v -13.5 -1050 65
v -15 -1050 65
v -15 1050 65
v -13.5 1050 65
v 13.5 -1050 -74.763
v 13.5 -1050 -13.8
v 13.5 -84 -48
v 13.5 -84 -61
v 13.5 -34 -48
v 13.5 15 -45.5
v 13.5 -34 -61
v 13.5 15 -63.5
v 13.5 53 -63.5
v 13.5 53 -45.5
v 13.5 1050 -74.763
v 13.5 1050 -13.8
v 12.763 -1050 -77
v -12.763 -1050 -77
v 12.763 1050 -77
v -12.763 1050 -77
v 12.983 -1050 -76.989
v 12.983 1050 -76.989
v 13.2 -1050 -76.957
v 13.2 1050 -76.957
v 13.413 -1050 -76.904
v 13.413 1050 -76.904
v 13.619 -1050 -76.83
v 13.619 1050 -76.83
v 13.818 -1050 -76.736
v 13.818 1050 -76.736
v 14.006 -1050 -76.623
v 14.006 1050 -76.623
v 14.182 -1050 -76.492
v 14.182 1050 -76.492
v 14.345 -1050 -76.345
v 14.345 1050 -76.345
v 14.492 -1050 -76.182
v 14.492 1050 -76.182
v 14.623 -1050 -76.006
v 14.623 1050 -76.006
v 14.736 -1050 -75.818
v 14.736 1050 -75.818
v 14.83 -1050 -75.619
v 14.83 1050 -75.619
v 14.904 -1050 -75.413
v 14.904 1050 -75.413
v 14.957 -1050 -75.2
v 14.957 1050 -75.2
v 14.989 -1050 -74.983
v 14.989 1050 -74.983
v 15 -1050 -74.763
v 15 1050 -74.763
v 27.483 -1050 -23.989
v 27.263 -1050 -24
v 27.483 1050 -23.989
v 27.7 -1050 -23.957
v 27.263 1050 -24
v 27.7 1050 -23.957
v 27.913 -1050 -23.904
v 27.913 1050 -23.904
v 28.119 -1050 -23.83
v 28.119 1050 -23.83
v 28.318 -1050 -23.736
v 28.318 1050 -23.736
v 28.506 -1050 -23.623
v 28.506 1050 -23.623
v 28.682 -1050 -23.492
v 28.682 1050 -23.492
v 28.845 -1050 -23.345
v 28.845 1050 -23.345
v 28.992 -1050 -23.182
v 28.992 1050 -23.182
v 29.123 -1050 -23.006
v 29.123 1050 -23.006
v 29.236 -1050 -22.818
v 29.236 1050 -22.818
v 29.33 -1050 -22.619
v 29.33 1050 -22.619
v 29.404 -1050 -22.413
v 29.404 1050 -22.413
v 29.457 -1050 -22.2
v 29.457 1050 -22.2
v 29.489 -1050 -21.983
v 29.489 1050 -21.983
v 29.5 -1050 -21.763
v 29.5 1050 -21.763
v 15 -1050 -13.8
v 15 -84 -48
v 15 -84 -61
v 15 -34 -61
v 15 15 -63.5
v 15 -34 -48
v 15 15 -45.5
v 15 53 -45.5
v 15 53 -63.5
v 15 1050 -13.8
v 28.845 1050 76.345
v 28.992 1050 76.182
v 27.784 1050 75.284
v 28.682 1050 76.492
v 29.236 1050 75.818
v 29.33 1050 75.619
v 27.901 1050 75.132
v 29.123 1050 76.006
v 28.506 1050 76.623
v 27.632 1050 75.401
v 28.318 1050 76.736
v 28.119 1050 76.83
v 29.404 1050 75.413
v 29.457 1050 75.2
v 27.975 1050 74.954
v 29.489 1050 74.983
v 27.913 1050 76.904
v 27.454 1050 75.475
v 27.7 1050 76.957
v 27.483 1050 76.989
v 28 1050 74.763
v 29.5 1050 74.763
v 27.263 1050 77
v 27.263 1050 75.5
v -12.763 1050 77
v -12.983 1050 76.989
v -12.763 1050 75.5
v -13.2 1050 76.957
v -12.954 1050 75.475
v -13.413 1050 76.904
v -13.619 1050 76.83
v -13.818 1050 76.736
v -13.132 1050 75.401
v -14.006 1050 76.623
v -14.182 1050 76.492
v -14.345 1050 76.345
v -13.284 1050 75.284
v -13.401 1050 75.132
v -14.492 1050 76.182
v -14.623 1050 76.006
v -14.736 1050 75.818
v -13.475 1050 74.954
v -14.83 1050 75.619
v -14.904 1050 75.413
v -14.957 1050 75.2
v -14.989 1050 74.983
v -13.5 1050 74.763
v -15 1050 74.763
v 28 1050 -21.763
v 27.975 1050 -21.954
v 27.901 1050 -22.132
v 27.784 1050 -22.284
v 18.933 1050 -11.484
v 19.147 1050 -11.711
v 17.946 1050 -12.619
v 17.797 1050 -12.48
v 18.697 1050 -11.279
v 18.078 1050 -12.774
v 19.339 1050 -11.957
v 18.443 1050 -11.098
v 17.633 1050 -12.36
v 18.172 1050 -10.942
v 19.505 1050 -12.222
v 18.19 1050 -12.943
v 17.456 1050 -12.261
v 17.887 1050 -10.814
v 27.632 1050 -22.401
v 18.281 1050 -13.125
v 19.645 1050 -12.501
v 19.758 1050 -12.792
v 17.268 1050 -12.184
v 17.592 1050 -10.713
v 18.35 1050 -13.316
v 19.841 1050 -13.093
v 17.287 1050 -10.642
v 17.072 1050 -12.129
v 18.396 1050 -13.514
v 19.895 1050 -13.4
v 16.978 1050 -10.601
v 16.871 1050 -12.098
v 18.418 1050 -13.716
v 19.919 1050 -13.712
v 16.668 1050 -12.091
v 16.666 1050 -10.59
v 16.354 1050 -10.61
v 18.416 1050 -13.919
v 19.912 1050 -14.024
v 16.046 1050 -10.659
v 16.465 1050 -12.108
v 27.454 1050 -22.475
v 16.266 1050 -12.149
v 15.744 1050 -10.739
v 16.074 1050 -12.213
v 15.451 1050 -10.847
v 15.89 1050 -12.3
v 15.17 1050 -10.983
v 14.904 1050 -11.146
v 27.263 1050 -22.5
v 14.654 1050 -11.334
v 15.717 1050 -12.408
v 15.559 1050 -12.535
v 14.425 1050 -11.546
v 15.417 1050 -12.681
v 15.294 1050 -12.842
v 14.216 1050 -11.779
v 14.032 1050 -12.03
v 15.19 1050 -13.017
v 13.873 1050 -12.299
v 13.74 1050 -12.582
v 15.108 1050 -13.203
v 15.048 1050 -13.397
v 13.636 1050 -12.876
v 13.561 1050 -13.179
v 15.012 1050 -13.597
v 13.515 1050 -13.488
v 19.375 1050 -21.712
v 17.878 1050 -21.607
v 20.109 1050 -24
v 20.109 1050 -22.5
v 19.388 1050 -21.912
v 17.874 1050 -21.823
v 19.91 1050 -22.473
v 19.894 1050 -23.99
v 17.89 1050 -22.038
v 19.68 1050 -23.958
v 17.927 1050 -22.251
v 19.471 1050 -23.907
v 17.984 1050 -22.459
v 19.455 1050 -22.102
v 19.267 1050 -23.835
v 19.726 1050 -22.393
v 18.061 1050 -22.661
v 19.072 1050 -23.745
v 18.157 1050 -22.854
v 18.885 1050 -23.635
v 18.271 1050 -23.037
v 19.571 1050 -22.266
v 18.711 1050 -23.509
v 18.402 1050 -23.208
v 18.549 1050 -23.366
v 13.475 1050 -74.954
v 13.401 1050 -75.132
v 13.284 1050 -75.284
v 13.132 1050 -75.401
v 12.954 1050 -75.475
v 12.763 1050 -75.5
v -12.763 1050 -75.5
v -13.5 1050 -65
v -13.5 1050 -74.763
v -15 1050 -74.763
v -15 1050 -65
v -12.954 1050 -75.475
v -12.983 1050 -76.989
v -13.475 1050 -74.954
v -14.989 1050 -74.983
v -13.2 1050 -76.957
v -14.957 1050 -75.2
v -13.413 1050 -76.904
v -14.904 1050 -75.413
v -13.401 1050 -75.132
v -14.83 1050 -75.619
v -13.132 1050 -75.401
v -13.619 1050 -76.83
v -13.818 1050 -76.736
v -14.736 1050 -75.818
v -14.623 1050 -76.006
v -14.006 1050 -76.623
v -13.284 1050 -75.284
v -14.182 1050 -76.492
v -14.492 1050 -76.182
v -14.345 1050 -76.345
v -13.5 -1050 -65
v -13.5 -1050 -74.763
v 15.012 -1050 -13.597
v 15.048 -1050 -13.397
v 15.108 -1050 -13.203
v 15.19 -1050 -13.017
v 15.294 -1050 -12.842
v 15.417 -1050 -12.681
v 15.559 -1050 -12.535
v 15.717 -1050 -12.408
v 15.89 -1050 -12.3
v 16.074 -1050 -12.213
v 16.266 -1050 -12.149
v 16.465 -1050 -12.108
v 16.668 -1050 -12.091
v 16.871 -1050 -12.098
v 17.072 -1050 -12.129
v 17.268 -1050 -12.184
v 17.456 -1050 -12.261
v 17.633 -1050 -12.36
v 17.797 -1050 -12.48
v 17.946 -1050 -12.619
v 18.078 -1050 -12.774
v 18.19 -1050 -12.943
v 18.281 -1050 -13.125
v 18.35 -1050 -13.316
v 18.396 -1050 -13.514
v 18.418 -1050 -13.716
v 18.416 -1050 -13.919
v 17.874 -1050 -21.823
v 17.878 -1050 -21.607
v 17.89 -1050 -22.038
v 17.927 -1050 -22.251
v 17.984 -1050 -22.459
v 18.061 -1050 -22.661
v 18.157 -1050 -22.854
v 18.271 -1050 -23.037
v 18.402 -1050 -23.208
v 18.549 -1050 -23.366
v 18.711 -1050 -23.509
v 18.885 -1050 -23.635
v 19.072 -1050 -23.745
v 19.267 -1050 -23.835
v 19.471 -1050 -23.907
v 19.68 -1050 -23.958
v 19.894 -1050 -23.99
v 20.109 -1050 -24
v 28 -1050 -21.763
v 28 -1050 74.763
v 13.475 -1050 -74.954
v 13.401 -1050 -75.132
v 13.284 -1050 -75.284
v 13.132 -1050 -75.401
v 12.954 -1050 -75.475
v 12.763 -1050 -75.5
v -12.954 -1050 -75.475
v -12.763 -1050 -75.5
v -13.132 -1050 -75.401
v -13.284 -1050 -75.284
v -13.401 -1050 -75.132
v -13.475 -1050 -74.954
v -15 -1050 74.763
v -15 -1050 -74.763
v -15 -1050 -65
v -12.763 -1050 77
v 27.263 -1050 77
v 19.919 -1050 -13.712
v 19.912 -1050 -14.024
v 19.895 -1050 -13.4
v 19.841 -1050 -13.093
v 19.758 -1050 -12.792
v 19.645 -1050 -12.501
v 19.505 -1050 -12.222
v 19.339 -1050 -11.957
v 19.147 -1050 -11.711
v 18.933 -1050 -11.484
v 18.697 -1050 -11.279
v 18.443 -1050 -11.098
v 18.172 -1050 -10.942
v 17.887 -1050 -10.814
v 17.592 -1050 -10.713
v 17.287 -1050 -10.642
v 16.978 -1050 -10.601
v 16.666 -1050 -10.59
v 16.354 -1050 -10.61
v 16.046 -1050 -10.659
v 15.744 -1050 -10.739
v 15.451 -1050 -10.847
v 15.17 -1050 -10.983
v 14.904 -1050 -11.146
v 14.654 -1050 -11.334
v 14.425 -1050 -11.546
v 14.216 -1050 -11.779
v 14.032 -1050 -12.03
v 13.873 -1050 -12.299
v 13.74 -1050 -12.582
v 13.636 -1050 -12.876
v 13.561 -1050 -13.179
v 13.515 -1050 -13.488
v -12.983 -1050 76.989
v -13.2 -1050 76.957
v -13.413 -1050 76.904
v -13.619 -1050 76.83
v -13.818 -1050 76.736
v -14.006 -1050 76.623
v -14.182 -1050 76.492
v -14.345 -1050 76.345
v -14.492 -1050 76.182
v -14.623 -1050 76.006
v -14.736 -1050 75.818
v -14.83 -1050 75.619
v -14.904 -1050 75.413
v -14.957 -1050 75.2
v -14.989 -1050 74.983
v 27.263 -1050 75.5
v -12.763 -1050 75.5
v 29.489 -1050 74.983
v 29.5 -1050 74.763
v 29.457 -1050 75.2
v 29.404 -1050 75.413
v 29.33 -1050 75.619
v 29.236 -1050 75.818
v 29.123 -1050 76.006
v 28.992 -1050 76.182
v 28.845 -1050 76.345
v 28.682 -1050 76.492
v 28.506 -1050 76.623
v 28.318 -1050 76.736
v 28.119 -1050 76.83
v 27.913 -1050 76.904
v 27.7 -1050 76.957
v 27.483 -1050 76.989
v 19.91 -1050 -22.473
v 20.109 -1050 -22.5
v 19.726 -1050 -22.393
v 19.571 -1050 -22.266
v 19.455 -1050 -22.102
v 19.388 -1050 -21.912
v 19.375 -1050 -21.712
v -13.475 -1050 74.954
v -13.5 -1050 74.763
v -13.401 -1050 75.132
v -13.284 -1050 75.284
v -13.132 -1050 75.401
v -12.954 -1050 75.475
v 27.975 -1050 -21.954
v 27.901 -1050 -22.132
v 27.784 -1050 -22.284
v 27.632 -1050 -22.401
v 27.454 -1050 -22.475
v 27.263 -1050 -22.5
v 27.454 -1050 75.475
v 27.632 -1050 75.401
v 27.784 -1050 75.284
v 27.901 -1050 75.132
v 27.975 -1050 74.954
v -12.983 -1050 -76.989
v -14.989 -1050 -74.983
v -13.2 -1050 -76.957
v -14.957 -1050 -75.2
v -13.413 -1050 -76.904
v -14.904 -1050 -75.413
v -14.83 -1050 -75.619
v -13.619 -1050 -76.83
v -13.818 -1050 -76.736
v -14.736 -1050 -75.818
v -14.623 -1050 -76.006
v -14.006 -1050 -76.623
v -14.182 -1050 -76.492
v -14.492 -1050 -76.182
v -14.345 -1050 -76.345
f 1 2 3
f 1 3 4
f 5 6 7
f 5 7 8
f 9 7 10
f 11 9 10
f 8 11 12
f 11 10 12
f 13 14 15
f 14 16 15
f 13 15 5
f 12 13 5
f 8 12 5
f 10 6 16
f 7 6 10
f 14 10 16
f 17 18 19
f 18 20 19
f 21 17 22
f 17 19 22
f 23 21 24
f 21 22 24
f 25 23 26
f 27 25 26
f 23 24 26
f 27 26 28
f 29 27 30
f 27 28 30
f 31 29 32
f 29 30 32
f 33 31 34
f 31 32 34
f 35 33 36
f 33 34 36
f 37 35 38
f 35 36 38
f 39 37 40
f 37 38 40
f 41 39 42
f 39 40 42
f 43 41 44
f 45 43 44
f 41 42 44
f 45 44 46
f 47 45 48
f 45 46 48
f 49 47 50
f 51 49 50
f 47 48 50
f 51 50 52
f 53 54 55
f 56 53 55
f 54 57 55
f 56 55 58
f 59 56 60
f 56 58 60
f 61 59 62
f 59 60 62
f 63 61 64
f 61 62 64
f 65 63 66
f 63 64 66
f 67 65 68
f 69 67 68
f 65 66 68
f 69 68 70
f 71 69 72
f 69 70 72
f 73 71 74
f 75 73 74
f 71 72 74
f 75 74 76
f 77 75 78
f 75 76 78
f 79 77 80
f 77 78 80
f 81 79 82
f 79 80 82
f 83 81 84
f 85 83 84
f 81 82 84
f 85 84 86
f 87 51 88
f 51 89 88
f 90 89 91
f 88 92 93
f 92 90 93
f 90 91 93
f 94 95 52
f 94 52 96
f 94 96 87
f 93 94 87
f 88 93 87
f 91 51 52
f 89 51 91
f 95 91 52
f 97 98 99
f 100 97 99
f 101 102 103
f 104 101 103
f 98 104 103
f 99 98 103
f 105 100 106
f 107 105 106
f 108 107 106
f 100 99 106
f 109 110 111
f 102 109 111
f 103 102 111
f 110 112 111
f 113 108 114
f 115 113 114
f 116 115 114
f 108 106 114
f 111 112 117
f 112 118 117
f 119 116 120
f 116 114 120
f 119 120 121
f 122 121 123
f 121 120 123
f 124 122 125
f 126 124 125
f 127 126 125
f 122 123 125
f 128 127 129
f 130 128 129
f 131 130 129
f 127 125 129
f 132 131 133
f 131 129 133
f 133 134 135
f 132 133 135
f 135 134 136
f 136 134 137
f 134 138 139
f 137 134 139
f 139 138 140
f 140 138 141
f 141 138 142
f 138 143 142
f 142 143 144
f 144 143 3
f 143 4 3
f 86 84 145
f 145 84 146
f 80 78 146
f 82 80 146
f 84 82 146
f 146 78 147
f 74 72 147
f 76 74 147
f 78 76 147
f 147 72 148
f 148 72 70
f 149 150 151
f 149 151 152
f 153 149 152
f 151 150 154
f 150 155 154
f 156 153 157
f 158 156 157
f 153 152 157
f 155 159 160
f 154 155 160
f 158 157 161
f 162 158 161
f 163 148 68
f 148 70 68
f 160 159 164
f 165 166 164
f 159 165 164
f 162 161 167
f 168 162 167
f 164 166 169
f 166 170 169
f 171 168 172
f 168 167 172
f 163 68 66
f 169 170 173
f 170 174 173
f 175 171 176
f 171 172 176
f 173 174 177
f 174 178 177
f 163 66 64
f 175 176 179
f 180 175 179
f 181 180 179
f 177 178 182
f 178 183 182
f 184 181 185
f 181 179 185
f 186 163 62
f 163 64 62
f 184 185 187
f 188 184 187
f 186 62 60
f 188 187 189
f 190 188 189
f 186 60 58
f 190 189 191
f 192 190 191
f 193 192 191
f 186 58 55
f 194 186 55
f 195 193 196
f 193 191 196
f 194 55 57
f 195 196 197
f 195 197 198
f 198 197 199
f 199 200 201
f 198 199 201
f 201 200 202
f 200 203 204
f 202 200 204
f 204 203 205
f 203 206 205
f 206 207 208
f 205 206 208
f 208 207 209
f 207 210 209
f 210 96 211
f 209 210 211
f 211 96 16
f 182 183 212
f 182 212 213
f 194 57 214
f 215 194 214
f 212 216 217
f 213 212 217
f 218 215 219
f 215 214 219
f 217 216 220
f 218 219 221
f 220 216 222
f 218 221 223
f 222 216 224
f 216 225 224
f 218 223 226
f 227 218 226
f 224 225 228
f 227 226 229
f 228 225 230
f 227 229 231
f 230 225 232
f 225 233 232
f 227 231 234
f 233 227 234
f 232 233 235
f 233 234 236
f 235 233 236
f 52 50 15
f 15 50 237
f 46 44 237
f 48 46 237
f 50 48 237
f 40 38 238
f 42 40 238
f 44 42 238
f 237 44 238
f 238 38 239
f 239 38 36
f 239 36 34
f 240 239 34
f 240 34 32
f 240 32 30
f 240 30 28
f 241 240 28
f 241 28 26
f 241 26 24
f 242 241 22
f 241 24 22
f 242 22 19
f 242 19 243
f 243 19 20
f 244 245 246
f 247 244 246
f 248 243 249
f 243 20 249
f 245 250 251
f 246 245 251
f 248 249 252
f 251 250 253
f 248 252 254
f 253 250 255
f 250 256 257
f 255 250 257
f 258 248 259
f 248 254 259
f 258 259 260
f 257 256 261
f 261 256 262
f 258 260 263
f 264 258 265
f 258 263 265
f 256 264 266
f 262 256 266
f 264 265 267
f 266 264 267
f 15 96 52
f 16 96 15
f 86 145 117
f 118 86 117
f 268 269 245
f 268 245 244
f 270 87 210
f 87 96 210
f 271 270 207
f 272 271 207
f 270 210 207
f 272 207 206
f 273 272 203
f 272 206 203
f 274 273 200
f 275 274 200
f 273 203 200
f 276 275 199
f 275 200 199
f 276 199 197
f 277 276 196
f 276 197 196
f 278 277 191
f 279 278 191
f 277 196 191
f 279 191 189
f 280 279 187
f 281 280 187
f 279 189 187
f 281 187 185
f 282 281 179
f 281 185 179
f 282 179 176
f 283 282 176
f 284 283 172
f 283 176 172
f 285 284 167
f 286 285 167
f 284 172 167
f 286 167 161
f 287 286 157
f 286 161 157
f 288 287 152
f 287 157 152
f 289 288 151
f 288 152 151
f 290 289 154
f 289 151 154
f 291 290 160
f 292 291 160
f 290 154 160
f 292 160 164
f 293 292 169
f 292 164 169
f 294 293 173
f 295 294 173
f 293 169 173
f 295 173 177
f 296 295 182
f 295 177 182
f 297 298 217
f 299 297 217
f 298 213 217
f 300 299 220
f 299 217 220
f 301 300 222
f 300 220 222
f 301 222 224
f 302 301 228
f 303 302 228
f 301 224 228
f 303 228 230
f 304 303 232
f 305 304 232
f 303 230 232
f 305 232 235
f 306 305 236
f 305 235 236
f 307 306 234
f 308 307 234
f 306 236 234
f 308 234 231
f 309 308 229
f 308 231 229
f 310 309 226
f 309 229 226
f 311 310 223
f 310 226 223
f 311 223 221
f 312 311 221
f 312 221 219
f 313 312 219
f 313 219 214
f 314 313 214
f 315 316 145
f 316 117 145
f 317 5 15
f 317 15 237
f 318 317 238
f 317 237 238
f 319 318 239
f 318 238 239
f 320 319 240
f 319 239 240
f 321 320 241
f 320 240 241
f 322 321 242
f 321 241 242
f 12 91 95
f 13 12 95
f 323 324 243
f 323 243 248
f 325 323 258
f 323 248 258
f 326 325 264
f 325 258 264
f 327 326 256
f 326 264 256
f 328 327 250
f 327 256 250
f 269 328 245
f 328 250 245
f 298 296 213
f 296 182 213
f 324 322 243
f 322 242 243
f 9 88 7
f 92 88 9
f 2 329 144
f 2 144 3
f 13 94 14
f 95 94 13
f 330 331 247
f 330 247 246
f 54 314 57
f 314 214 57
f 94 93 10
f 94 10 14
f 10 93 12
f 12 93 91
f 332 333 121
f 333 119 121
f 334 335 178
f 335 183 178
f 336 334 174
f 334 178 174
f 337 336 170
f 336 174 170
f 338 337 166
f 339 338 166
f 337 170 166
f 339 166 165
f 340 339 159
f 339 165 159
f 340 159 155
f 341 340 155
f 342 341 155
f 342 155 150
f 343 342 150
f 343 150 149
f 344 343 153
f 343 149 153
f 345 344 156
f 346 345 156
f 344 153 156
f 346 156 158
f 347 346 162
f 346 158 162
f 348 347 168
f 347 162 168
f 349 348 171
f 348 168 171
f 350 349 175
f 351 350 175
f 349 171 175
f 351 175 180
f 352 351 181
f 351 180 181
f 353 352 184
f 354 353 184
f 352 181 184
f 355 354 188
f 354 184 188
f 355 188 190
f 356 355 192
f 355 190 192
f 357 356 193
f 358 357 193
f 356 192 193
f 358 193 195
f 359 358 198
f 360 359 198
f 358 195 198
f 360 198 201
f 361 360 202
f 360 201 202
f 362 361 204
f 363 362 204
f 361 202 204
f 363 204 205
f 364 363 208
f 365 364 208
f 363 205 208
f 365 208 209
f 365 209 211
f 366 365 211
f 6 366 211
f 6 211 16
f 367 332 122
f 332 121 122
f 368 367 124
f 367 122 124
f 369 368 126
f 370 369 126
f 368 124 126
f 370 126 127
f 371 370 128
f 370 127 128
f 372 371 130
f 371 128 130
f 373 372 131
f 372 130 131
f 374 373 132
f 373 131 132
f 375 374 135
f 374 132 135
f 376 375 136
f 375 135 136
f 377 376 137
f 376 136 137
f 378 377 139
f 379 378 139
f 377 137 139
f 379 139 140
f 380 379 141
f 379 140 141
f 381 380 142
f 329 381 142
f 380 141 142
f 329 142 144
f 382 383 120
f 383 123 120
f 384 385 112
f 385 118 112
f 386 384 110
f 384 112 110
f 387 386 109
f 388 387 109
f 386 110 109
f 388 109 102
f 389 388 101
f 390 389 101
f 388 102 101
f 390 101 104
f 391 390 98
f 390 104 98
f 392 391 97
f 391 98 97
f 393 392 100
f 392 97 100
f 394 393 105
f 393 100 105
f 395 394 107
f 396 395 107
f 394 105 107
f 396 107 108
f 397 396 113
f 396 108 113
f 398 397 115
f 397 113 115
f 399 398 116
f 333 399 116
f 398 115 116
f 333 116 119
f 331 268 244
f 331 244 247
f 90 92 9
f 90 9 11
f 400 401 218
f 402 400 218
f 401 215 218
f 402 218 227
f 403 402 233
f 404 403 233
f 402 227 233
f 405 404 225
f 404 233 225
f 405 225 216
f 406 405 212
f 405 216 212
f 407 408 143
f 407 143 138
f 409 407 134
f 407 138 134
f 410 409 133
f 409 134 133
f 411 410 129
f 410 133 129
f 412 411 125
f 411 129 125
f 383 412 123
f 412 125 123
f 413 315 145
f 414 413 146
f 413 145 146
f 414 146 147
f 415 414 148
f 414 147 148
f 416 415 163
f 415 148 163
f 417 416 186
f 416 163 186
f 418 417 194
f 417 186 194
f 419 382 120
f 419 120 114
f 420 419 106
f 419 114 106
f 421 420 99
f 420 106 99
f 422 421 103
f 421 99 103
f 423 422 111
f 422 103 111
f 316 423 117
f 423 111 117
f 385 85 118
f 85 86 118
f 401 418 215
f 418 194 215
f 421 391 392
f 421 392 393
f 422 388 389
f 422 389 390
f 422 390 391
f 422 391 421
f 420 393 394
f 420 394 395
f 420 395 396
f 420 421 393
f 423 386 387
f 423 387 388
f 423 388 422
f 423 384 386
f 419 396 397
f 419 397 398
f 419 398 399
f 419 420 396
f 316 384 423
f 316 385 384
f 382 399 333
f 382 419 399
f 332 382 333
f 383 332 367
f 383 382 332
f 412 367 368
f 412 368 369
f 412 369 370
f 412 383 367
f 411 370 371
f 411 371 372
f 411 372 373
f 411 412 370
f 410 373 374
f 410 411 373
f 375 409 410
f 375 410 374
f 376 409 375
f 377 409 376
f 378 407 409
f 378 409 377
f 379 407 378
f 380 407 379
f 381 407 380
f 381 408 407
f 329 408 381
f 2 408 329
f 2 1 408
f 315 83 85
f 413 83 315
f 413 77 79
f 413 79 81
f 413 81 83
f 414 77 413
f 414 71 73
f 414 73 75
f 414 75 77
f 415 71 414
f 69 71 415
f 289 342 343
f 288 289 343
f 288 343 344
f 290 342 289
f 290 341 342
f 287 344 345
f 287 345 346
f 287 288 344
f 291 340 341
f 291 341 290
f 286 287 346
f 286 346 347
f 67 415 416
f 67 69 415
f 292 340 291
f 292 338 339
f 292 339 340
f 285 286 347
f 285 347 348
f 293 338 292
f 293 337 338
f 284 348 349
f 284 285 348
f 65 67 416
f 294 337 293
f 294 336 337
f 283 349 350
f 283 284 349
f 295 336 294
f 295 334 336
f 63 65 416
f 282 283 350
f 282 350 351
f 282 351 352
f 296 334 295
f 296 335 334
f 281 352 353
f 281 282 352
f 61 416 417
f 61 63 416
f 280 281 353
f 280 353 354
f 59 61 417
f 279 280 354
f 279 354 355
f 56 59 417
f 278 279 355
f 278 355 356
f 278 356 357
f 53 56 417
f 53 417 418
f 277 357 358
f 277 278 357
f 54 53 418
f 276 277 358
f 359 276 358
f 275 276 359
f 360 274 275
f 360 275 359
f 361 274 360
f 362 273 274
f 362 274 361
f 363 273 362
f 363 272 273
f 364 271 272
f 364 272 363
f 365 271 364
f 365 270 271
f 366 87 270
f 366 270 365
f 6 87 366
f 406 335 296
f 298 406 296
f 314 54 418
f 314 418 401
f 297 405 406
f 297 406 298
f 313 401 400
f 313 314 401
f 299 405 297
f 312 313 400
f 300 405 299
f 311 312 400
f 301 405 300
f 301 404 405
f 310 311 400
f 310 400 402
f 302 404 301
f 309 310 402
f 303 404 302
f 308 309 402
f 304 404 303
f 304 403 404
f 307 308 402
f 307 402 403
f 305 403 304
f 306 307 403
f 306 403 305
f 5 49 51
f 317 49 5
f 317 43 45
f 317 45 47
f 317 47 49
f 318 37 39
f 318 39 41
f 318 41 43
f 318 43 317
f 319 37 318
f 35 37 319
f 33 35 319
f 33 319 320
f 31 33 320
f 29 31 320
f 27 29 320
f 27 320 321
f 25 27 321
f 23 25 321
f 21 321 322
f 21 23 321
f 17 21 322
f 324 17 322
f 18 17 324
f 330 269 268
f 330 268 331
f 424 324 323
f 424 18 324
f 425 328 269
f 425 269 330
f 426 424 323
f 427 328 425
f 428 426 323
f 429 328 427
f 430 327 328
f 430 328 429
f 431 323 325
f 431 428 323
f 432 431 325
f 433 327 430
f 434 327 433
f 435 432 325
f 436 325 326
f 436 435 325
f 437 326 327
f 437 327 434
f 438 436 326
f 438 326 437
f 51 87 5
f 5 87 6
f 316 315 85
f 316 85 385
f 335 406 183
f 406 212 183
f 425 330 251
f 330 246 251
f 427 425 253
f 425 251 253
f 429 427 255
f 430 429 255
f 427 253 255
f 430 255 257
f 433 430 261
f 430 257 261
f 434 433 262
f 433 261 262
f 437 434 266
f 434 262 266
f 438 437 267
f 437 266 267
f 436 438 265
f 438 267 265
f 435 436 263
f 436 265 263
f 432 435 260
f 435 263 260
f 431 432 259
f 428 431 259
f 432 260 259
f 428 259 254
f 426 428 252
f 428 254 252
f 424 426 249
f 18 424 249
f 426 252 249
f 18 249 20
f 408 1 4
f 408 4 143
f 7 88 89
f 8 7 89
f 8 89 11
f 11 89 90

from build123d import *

# Parameters (mm, degrees)
BASE_FLANGE1_DEPTH = 1050
SKETCH2_W          = 18
SKETCH2_H          = 38
SKETCH2_W_2        = 13
SKETCH2_H_2        = 50
CUT_EXTRUDE1_DEPTH = 10


# Sheet-metal steps are written as plain solids
with BuildPart() as part:
    # Sketch1 → Base-Flange1 (new, symmetric)
    with BuildSketch(Plane(origin=(0, 0, 0), x_dir=(1, 0, 0), z_dir=(0, 1, 0))):
        with BuildLine():
            Line((-15, 65), (-15, 74.7634))
            ThreePointArc((-15, 74.7634), (-14.344915027, 76.344915027), (-12.7634, 77))
            Line((-12.7634, 77), (12.7634, 77))
            ThreePointArc((12.7634, 77), (14.344915027, 76.344915027), (15, 74.7634))
            Line((15, 74.7634), (15, 30))
            Line((15, 30), (15, 24))
            Line((15, 24), (15, 13.8))
            ThreePointArc((15, 13.8), (16.769678139, 12.091041686), (18.415834526, 13.91928357))
            Line((18.415834526, 13.91928357), (17.878230266, 21.607382671))
            ThreePointArc((17.878230266, 21.607382671), (18.473636332, 23.288757532), (20.109382021, 24))
            Line((20.109382021, 24), (27.2634, 24))
            ThreePointArc((27.2634, 24), (28.844915027, 23.344915027), (29.5, 21.7634))
            Line((29.5, 21.7634), (29.5, -30))
            Line((29.5, -30), (29.5, -74.7634))
            ThreePointArc((29.5, -74.7634), (28.844915027, -76.344915027), (27.2634, -77))
            Line((27.2634, -77), (15, -77))
            Line((15, -77), (-12.7634, -77))
            ThreePointArc((-12.7634, -77), (-14.344915027, -76.344915027), (-15, -74.7634))
            Line((-15, -74.7634), (-15, -65))
            Line((-15, -65), (-13.5, -65))
            Line((-13.5, -65), (-13.5, -74.7634))
            ThreePointArc((-13.5, -74.7634), (-13.284254855, -75.284254855), (-12.7634, -75.5))
            Line((-12.7634, -75.5), (15, -75.5))
            Line((15, -75.5), (27.2634, -75.5))
            ThreePointArc((27.2634, -75.5), (27.784254855, -75.284254855), (28, -74.7634))
            Line((28, -74.7634), (28, -30))
            Line((28, -30), (28, 21.7634))
            ThreePointArc((28, 21.7634), (27.784254855, 22.284254855), (27.2634, 22.5))
            Line((27.2634, 22.5), (20.109382021, 22.5))
            ThreePointArc((20.109382021, 22.5), (19.570666884, 22.265759992), (19.374576341, 21.712017381))
            Line((19.374576341, 21.712017381), (19.912180601, 14.023918281))
            ThreePointArc((19.912180601, 14.023918281), (16.822027384, 10.591955445), (13.5, 13.8))
            Line((13.5, 13.8), (13.5, 24))
            Line((13.5, 24), (13.5, 30))
            Line((13.5, 30), (13.5, 74.7634))
            ThreePointArc((13.5, 74.7634), (13.284254855, 75.284254855), (12.7634, 75.5))
            Line((12.7634, 75.5), (-12.7634, 75.5))
            ThreePointArc((-12.7634, 75.5), (-13.284254855, 75.284254855), (-13.5, 74.7634))
            Line((-13.5, 74.7634), (-13.5, 65))
            Line((-13.5, 65), (-15, 65))
        make_face()
    extrude(amount=BASE_FLANGE1_DEPTH, both=True)

    # Sketch2 → Cut-Extrude1 (cut)
    with BuildSketch(Plane(origin=(15, 0, 0), x_dir=(0, 0, -1), z_dir=(1, 0, 0))):
        with Locations((54.5, 34)):
            Rectangle(SKETCH2_W, SKETCH2_H)
        with Locations((54.5, -59)):
            Rectangle(SKETCH2_W_2, SKETCH2_H_2)
    extrude(amount=-CUT_EXTRUDE1_DEPTH, mode=Mode.SUBTRACT)


solid = part.part
